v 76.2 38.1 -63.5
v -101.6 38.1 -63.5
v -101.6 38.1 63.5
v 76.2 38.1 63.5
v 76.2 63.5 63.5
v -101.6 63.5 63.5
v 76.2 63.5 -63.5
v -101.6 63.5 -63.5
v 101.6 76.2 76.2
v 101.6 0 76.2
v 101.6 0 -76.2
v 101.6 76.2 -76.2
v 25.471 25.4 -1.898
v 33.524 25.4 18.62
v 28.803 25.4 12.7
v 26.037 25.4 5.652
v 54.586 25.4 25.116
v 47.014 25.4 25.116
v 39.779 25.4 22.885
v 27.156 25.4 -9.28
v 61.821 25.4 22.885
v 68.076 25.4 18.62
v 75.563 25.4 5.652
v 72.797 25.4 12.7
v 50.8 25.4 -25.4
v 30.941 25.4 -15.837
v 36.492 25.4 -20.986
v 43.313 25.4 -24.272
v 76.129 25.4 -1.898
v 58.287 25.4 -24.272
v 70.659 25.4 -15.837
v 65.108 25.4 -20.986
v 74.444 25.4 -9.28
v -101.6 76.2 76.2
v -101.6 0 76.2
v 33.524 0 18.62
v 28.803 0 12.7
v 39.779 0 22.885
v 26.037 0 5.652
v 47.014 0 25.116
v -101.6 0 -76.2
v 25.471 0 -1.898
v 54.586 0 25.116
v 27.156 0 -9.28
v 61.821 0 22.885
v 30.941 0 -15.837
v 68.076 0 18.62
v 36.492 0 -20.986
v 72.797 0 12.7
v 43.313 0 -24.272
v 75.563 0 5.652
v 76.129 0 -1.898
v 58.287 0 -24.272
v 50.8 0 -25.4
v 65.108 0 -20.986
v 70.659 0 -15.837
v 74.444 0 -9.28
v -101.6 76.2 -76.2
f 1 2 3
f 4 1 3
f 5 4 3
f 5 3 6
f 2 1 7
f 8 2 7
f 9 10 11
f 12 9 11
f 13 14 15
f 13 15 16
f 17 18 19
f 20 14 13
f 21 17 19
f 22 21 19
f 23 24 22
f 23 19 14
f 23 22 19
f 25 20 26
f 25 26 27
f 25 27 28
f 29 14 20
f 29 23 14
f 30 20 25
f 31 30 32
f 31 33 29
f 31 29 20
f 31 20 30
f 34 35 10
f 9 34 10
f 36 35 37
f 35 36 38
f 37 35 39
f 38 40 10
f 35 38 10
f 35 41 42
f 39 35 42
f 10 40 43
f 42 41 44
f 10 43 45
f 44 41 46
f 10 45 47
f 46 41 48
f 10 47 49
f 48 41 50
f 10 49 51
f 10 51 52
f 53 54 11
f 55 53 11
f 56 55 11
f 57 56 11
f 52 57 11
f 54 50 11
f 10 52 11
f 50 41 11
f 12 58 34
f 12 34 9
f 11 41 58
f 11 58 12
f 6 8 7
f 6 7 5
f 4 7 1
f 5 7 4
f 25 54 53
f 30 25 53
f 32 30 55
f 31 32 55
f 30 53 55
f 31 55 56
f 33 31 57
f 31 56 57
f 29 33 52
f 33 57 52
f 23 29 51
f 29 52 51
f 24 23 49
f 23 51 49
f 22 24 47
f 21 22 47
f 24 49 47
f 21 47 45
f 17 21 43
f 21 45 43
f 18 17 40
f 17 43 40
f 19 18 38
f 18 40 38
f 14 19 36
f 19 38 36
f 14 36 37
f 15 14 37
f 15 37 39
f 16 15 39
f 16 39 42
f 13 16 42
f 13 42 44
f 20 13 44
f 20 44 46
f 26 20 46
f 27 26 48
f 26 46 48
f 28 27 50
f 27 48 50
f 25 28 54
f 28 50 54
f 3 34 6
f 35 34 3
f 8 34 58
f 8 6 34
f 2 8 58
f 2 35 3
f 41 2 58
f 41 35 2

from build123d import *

# Parameters (mm, degrees)
SKETCH2_W          = 203.2
SKETCH2_H          = 152.4
LINK2_DEPTH        = 76.2
SKETCH3_R          = 25.4
CUT_EXTRUDE1_DEPTH = 25.4
SKETCH4_W          = 127
SKETCH4_H          = 25.4
CUT_EXTRUDE2_DEPTH = 177.8


with BuildPart() as part:
    # Sketch2 → link2 (new body)
    with BuildSketch(Plane(origin=(0, 0, 0), x_dir=(1, 0, 0), z_dir=(0, 1, 0))):
        Rectangle(SKETCH2_W, SKETCH2_H)
    extrude(amount=LINK2_DEPTH)

    # Sketch3 → Cut-Extrude1 (cut)
    with BuildSketch(Plane.XZ):
        with Locations(Location((50.8, 0, 0), (0, 0, 270))):
            Circle(SKETCH3_R)
    extrude(amount=-CUT_EXTRUDE1_DEPTH, mode=Mode.SUBTRACT)

    # Sketch4 → Cut-Extrude2 (cut)
    with BuildSketch(Plane.ZY.offset(101.6)):
        with Locations((0, 50.8)):
            Rectangle(SKETCH4_W, SKETCH4_H)
    extrude(amount=-CUT_EXTRUDE2_DEPTH, mode=Mode.SUBTRACT)


solid = part.part
